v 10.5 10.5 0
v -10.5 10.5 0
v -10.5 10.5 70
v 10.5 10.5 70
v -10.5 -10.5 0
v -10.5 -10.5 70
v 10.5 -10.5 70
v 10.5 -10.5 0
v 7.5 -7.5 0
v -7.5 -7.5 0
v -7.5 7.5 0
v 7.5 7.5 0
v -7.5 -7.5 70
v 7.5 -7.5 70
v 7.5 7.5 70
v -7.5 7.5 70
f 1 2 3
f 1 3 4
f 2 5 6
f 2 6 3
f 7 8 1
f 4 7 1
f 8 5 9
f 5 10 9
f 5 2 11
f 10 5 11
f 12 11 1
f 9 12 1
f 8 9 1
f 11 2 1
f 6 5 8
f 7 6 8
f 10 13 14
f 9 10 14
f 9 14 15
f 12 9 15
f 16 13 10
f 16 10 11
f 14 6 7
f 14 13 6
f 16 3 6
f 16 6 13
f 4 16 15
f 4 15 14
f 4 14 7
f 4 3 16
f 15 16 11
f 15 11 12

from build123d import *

# Parameters (mm, degrees)
CROQUIS1_W              = 21
CROQUIS1_H              = 21
CROQUIS1_W_2            = 15
CROQUIS1_H_2            = 15
SALIENTE_EXTRUIR1_DEPTH = 70


with BuildPart() as part:
    # Croquis1 → Saliente-Extruir1 (new body)
    with BuildSketch(Plane.XY):
        Rectangle(CROQUIS1_W, CROQUIS1_H)
        Rectangle(CROQUIS1_W_2, CROQUIS1_H_2, mode=Mode.SUBTRACT)
    extrude(amount=SALIENTE_EXTRUIR1_DEPTH)


solid = part.part
